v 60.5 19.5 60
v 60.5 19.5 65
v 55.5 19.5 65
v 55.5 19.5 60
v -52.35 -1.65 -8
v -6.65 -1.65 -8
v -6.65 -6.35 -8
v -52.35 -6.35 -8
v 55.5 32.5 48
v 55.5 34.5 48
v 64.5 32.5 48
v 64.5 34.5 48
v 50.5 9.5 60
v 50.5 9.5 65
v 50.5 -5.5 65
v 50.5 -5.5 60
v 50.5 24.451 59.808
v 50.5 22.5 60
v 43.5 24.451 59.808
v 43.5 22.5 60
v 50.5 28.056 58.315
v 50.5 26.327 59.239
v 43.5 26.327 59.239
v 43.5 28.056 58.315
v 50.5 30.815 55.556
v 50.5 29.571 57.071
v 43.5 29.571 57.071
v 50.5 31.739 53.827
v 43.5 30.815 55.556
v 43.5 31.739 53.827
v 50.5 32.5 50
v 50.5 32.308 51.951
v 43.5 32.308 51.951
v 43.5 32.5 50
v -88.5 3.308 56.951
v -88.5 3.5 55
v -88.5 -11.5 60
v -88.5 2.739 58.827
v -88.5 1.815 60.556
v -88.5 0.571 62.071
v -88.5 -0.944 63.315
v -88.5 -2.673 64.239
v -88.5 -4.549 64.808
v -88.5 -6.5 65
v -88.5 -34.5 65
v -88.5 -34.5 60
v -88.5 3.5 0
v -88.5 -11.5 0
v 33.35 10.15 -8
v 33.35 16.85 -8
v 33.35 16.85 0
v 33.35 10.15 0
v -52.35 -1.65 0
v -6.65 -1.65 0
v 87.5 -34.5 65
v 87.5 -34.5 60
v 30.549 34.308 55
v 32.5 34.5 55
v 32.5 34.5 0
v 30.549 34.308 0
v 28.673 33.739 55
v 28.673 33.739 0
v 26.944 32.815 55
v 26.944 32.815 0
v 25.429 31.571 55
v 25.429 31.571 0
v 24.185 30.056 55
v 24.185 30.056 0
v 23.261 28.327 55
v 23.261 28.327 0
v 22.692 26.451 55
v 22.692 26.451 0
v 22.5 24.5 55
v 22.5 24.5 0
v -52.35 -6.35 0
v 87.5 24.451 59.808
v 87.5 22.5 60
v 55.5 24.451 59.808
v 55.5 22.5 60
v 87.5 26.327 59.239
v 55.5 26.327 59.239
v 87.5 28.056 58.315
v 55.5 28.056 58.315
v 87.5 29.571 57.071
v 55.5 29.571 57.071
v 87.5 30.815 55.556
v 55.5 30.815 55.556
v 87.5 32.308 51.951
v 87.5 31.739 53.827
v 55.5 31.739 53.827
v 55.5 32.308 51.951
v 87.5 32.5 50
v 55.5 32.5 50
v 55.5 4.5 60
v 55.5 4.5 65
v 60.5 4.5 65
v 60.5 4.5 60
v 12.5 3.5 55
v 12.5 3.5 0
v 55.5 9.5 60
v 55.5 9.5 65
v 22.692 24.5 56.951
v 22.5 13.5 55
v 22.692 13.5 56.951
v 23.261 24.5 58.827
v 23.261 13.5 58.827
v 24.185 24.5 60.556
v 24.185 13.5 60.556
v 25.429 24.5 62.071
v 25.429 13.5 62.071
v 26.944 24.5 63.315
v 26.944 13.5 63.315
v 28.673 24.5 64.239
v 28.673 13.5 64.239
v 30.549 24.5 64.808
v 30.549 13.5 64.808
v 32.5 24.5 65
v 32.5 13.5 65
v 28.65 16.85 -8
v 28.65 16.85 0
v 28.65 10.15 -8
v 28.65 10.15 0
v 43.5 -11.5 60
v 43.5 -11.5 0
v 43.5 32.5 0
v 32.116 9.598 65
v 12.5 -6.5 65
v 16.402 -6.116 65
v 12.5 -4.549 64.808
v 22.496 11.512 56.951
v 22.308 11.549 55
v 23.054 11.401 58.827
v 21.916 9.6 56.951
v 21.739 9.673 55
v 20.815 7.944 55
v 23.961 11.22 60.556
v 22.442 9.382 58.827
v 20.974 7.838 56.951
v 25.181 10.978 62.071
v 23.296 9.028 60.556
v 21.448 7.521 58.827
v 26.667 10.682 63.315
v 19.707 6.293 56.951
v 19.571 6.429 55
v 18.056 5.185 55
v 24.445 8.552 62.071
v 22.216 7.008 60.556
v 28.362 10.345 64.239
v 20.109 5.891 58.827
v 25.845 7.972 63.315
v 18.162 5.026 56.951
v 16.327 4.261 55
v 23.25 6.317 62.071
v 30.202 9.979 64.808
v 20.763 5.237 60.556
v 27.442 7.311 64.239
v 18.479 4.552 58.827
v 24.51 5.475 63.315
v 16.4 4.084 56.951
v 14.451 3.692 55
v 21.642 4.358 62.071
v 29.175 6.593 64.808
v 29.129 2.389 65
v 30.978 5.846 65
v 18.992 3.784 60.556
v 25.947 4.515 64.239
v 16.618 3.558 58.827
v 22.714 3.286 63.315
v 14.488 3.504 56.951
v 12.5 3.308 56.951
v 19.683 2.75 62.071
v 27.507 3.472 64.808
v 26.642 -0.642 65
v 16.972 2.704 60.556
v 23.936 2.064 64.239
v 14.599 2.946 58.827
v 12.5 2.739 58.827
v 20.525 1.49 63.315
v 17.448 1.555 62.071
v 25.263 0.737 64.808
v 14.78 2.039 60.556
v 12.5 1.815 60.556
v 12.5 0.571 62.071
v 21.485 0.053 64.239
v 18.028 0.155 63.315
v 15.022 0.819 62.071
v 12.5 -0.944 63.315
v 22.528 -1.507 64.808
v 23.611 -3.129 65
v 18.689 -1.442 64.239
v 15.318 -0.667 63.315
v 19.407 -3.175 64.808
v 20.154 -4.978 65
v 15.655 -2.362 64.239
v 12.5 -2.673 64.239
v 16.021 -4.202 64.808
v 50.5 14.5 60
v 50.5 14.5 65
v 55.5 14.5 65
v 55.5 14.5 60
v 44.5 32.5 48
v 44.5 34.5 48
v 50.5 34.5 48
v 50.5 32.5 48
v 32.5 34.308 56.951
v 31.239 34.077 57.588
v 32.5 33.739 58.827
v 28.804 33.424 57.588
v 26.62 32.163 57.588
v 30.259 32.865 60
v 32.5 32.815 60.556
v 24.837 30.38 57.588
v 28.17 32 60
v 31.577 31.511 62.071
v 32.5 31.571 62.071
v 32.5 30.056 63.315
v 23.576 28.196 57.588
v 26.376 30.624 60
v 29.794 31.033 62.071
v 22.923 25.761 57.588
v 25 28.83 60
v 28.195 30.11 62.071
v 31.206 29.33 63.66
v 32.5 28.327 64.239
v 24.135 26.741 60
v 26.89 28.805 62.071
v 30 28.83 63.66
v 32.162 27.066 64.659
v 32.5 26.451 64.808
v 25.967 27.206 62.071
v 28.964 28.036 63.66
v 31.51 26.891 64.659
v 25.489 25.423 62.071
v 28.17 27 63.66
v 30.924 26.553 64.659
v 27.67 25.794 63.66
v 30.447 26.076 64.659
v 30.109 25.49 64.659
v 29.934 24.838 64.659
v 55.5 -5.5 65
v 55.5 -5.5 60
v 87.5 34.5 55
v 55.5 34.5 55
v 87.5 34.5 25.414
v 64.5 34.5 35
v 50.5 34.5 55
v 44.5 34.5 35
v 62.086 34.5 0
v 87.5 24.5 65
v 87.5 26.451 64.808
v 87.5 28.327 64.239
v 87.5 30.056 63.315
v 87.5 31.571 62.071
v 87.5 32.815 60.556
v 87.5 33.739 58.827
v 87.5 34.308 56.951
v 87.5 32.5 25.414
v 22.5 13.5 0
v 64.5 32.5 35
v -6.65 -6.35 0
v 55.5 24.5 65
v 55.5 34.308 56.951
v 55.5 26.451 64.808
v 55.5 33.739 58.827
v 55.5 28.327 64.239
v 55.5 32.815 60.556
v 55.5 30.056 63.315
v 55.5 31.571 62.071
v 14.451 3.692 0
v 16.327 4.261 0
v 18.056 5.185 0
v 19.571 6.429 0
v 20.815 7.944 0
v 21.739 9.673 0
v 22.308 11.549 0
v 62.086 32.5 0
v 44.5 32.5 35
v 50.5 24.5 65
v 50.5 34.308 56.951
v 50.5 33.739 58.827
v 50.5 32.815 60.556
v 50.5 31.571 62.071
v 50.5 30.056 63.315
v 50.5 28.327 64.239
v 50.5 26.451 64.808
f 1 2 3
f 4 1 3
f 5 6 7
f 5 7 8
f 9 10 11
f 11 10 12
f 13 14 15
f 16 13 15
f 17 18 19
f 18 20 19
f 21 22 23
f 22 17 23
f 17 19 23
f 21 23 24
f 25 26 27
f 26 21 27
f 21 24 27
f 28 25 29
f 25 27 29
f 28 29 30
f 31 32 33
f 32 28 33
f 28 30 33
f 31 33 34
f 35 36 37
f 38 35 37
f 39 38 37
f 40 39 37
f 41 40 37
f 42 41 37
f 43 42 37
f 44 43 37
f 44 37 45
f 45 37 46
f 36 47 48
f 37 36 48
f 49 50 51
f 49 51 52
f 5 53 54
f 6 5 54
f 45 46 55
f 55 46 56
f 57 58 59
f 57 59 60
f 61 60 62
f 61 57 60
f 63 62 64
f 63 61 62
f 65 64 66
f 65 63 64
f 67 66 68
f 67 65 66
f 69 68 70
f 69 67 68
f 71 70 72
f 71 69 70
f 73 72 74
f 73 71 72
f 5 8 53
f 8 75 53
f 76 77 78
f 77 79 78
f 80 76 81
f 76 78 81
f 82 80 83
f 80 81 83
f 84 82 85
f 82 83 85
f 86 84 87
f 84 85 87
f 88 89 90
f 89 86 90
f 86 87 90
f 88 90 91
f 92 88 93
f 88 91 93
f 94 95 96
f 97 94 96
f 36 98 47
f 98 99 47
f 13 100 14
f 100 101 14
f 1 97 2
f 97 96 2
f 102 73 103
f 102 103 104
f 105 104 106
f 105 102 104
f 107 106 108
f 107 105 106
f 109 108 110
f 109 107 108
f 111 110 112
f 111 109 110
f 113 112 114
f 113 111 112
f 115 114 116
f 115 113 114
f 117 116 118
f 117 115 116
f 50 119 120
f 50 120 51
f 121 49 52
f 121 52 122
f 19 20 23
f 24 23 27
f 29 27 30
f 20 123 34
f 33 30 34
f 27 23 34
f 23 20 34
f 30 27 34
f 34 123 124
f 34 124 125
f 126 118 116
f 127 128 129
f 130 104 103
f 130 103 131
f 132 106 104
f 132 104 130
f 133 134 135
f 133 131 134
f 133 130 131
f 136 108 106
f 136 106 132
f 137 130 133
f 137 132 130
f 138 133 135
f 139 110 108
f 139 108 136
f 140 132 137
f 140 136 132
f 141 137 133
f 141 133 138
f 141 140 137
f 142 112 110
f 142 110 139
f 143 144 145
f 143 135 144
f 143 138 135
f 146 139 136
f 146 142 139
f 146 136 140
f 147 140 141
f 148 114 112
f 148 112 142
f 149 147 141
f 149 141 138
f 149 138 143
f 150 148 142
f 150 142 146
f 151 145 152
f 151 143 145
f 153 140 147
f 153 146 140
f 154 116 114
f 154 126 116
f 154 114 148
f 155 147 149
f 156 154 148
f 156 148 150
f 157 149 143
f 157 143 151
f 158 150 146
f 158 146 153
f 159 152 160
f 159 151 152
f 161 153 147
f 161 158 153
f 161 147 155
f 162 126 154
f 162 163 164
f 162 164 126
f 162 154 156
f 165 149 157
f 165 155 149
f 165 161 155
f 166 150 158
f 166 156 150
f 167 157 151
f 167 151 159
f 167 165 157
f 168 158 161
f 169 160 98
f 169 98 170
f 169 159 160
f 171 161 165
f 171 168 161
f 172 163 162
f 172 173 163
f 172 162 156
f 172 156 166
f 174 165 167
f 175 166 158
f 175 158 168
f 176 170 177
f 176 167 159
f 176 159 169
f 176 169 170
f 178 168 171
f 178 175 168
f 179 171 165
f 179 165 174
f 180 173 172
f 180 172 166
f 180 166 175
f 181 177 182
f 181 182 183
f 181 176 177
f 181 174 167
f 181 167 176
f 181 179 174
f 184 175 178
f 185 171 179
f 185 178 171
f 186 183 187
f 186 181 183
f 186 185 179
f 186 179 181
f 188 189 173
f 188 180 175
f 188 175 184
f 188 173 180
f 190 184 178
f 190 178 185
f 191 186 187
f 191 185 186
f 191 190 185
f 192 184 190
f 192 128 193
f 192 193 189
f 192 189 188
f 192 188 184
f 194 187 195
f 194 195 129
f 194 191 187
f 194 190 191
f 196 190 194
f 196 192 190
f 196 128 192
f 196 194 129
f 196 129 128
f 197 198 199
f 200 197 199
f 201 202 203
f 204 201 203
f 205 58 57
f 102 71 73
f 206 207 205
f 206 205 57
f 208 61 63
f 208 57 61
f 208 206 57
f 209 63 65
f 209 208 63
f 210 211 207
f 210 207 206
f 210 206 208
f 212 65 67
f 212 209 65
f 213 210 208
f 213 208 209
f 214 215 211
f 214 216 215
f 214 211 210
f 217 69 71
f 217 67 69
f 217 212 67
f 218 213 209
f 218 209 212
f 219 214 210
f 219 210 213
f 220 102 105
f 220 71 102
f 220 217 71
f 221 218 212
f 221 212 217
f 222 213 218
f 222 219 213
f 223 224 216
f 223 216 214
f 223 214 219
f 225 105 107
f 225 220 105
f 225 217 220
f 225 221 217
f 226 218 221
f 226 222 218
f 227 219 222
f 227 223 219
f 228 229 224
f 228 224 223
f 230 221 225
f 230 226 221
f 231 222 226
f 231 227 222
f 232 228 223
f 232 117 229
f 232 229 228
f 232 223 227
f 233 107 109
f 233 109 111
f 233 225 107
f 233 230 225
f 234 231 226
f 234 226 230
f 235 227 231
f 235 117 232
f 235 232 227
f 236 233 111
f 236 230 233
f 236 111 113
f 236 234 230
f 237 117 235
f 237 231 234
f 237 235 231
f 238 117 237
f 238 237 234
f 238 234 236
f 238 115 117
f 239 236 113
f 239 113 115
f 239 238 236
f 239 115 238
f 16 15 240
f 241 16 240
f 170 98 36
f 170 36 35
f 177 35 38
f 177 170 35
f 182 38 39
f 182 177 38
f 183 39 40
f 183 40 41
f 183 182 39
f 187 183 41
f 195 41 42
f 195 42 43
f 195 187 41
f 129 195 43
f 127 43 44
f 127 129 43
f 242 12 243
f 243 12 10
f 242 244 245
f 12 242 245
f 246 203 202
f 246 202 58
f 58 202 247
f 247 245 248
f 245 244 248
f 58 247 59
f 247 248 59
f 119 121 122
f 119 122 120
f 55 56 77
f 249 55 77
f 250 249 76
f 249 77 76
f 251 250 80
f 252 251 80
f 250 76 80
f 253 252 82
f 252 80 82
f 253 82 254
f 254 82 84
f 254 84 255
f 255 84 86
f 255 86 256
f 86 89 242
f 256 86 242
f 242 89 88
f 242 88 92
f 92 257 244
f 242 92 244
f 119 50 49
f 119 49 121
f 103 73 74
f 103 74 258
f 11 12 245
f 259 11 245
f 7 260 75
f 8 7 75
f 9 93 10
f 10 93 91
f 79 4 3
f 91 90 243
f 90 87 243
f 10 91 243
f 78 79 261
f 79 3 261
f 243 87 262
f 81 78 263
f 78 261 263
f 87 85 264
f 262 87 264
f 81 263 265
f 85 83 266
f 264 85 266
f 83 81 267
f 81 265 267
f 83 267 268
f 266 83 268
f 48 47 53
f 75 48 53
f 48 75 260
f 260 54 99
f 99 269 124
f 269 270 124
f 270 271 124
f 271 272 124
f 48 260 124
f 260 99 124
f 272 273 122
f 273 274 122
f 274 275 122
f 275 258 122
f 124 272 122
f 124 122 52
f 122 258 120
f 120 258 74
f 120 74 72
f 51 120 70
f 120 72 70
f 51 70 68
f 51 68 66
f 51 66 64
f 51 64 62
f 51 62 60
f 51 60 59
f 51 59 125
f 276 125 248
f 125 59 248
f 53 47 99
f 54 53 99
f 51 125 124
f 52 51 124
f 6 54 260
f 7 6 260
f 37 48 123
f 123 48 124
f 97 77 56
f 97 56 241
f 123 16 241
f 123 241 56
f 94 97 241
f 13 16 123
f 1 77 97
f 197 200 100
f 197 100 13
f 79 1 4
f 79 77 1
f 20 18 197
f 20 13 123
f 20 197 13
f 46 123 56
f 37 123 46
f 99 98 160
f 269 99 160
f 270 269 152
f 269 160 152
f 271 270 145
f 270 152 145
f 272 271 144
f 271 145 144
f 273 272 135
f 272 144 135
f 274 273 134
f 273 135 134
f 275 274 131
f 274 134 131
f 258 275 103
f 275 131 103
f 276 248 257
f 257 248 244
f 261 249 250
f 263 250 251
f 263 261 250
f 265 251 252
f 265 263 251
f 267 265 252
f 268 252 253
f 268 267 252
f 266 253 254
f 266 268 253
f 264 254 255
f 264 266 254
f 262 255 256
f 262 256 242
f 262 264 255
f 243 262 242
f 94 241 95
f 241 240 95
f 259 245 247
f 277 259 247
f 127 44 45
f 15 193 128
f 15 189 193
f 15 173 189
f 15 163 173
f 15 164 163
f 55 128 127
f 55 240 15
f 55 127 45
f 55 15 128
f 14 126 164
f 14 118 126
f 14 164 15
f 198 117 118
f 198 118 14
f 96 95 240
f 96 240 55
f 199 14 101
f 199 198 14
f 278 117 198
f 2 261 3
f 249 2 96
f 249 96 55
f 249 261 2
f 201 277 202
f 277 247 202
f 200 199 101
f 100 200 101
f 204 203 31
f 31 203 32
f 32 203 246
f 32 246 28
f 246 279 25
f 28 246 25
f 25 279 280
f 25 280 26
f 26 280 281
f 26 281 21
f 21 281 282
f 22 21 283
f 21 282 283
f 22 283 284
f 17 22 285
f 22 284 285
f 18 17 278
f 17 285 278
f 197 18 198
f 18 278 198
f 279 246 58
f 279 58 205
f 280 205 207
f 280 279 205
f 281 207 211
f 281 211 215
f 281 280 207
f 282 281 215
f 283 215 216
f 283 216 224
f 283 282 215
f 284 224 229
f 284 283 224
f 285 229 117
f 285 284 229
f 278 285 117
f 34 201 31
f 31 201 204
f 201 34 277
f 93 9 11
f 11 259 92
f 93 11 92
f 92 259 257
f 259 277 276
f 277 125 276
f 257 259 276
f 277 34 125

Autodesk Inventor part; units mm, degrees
ref_plane "YZ Plane" through (0, 0, 0) normal (1, 0, 0) x (0, 1, 0)
ref_plane "XZ Plane" through (0, 0, 0) normal (0, 1, 0) x (-1, 0, 0)
ref_plane "XY Plane" through (0, 0, 0) normal (0, 0, 1) x (1, 0, 0)
sketch "Sketch1" plane through (0, 0, 0) normal (0, 0, 1) x (1, 0, 0)
  line L0 (-88.5, 34.5) -> (88.5, 34.5)
  line L1 (88.5, 34.5) -> (88.5, -34.5)
  line L2 (88.5, -34.5) -> (-88.5, -34.5)
  line L3 (-88.5, -34.5) -> (-88.5, 34.5)
  point P0 (0, 0)
  point P1 (-88.5, 0)
  point P2 (0, 34.5)
  dimension "d0" = 177
  dimension "d1" = 69
sketch "Sketch1 outline for Extrusion1" plane through (0, 0, 0) normal (0, 0, 1) x (1, 0, 0)
  line L0 (-88.5, -34.5) -> (88.5, -34.5)
  line L1 (-88.5, 34.5) -> (-88.5, -34.5)
  line L2 (88.5, 34.5) -> (-88.5, 34.5)
  line L3 (88.5, -34.5) -> (88.5, 34.5)
extrude "Extrusion1" add sketch "Sketch1 outline for Extrusion1" along normal blind 65
sketch "Sketch2" plane through (0, 0, 0) normal (0, 0, -1) x (-1, 0, 0)
  line L0 (232.5, 3.5) -> (-12.5, 3.5) projected
  line L1 (88.5, 34.5) -> (88.5, -34.5) projected
  line L2 (-88.5, 34.5) -> (88.5, 34.5) projected
  line L3 (-22.5, 34.5) -> (-22.5, 3.5)
  line L4 (-22.5, 13.5) -> (-22.5, 24.5) projected
  line L5 (-12.5, 3.5) -> (-22.5, 3.5)
  point P0 (0, 0)
  point P1 (88.5, 3.5)
sketch "Sketch2 outline for Extrusion2" plane through (0, 0, 0) normal (0, 0, -1) x (-1, 0, 0)
  line L0 (-22.5, 3.5) -> (-12.5, 3.5)
  line L1 (-22.5, 34.5) -> (-22.5, 3.5)
  line L2 (88.5, 34.5) -> (-22.5, 34.5)
  line L3 (88.5, 3.5) -> (88.5, 34.5)
  line L4 (-12.5, 3.5) -> (88.5, 3.5)
extrude "Extrusion2" cut sketch "Sketch2 outline for Extrusion2" against normal through all
fillet "Fillet1" radius 10 2 edges at (22.5, 3.5, 32.5) (22.5, 34.5, 32.5)
sketch "Sketch3" plane through (0, 0, 0) normal (0, 0, -1) x (-1, 0, 0)
  line L0 (-43.5, -11.5) -> (216.5, -11.5) projected
  line L1 (-43.5, 32.5) -> (-43.5, -11.5) projected
  line L2 (-90.5, 32.5) -> (-43.5, 32.5) projected
  line L3 (-88.5, 32.5) -> (-88.5, -34.5)
  line L4 (-88.5, -34.5) -> (88.5, -34.5)
  line L5 (88.5, -34.5) -> (88.5, -11.5)
  line L6 (88.5, 3.5) -> (88.5, -34.5) projected
  line L7 (88.5, -34.5) -> (-88.5, -34.5) projected
  line L8 (-88.5, -34.5) -> (-88.5, 34.5) projected
  point P0 (0, 0)
sketch "Sketch3 outline for Extrusion3" plane through (0, 0, 0) normal (0, 0, -1) x (-1, 0, 0)
  line L0 (-43.5, -11.5) -> (-43.5, 32.5)
  line L1 (88.5, -11.5) -> (-43.5, -11.5)
  line L2 (88.5, -34.5) -> (88.5, -11.5)
  line L3 (-88.5, -34.5) -> (88.5, -34.5)
  line L4 (-88.5, 32.5) -> (-88.5, -34.5)
  line L5 (-43.5, 32.5) -> (-88.5, 32.5)
extrude "Extrusion3" cut sketch "Sketch3 outline for Extrusion3" against normal blind 60
sketch "Sketch4" plane through (88.5, 34.5, 65) normal (0, 1, 0) x (1, 0, 0)
  line L0 (0, 65) -> (-56, 65)
  line L1 (0, 65) -> (0, 0)
  line L2 (0, 40) -> (-25, 65)
  line L3 (0, 38.585786) -> (-26.414214, 65)
  point P0 (-88.5, 65)
  dimension "d40" = 1
sketch "Sketch4 outline for Extrusion4" plane through (88.5, 34.5, 65) normal (0, 1, 0) x (1, 0, 0)
  line L0 (0, 65) -> (-26.414214, 65)
  line L1 (-26.414214, 65) -> (0, 38.585786)
  line L2 (0, 38.585786) -> (0, 65)
extrude "Extrusion4" cut sketch "Sketch4 outline for Extrusion4" against normal blind 60
sketch "Sketch5" plane through (0, 0, 65) normal (0, 0, 1) x (1, 0, 0)
  line L0 (50.5, -5.5) -> (55.5, -5.5)
  line L1 (55.5, -5.5) -> (55.5, 9.5)
  line L2 (55.5, 9.5) -> (50.5, 9.5)
  line L3 (50.5, 9.5) -> (50.5, -5.5)
  line L4 (-88.5, -34.5) -> (88.5, -34.5) projected
  line L5 (88.5, -34.5) -> (88.5, 34.5) projected
  line L6 (55.5, 9.5) -> (60.5, 9.5)
  line L7 (60.5, 9.5) -> (60.5, 4.5)
  line L8 (60.5, 4.5) -> (55.5, 4.5)
  line L9 (55.5, 4.5) -> (55.5, 9.5)
  line L10 (55.5, 19.5) -> (60.5, 19.5)
  line L11 (60.5, 19.5) -> (60.5, 9.5)
  line L12 (60.5, 9.5) -> (55.5, 9.5)
  line L13 (55.5, 9.5) -> (55.5, 19.5)
  line L14 (50.5, 19.5) -> (55.5, 19.5)
  line L15 (55.5, 19.5) -> (55.5, 14.5)
  line L16 (55.5, 14.5) -> (50.5, 14.5)
  line L17 (50.5, 14.5) -> (50.5, 19.5)
  line L18 (50.5, 34.5) -> (55.5, 34.5)
  line L19 (55.5, 34.5) -> (55.5, 19.5)
  line L20 (55.5, 19.5) -> (50.5, 19.5)
  line L21 (50.5, 19.5) -> (50.5, 34.5)
  line L22 (88.5, 34.5) -> (32.5, 34.5) projected
  point P0 (0, 0)
  dimension "d11" = 5
  dimension "d13" = 33
  dimension "d20" = 5
  dimension "d21" = 10
  dimension "d23" = 15
  dimension "d24" = 15
sketch "Sketch5 outline for Extrusion5" plane through (0, 0, 65) normal (0, 0, 1) x (1, 0, 0)
  line L0 (55.5, 9.5) -> (50.5, 9.5)
  line L1 (50.5, 9.5) -> (50.5, -5.5)
  line L2 (50.5, -5.5) -> (55.5, -5.5)
  line L3 (55.5, -5.5) -> (55.5, 4.5)
  line L4 (55.5, 4.5) -> (60.5, 4.5)
  line L5 (60.5, 4.5) -> (60.5, 19.5)
  line L6 (60.5, 19.5) -> (55.5, 19.5)
  line L7 (55.5, 19.5) -> (55.5, 34.5)
  line L8 (55.5, 34.5) -> (50.5, 34.5)
  line L9 (50.5, 34.5) -> (50.5, 14.5)
  line L10 (50.5, 14.5) -> (55.5, 14.5)
  line L11 (55.5, 14.5) -> (55.5, 9.5)
extrude "Extrusion5" cut sketch "Sketch5 outline for Extrusion5" against normal blind 30
sketch "Sketch6" plane through (0, 0, 0) normal (0, 0, -1) x (-1, 0, 0)
  line L0 (-28.5, 18.5) -> (-33.5, 18.5) projected
  line L1 (-33.5, 18.5) -> (-33.5, 8.5) projected
  line L2 (-28.5, 8.5) -> (-28.5, 18.5) projected
  line L3 (-33.5, 8.5) -> (-28.5, 8.5) projected
  line L4 (54.5, -1.5) -> (4.5, -1.5) projected
  line L5 (4.5, -1.5) -> (4.5, -6.5) projected
  line L6 (4.5, -6.5) -> (54.5, -6.5) projected
  line L7 (54.5, -6.5) -> (54.5, -1.5) projected
  line L8 (4.65, -1.65) -> (54.35, -1.65)
  line L9 (54.35, -1.65) -> (54.35, -6.35)
  line L10 (54.35, -6.35) -> (4.65, -6.35)
  line L11 (4.65, -6.35) -> (4.65, -1.65)
  line L12 (-33.35, 8.65) -> (-33.35, 18.35)
  line L13 (-33.35, 18.35) -> (-28.65, 18.35)
  line L14 (-28.65, 18.35) -> (-28.65, 8.65)
  line L15 (-28.65, 8.65) -> (-33.35, 8.65)
  line L16 (-33.35, 16.85) -> (-28.65, 16.85)
  line L17 (-33.35, 10.15) -> (-28.65, 10.15)
  line L18 (6.65, -6.35) -> (6.65, -1.65)
  line L19 (52.35, -6.35) -> (52.35, -1.65)
  point P0 (0, 0)
  dimension "d17" = 0.15
  dimension "d35" = 0.15
  dimension "d36" = 1.5
  dimension "d37" = 1.5
  dimension "d38" = 2
  dimension "d39" = 2
sketch "Sketch6 outline for Extrusion6" plane through (0, 0, 0) normal (0, 0, -1) x (-1, 0, 0)
  line L0 (-33.35, 10.15) -> (-28.65, 10.15)
  line L1 (-33.35, 16.85) -> (-33.35, 10.15)
  line L2 (-28.65, 16.85) -> (-33.35, 16.85)
  line L3 (-28.65, 10.15) -> (-28.65, 16.85)
  line L4 (52.35, -6.35) -> (52.35, -1.65)
  line L5 (6.65, -6.35) -> (52.35, -6.35)
  line L6 (6.65, -1.65) -> (6.65, -6.35)
  line L7 (52.35, -1.65) -> (6.65, -1.65)
extrude "Extrusion6" add sketch "Sketch6 outline for Extrusion6" along normal blind 8
fillet "Fillet2" radius 10 6 edges at (72, 34.5, 65) (25.4289, 31.5711, 65) (22.5, 19, 65) (19.5711, 6.4289, 65) (-38, 3.5, 65) (41.5, 34.5, 65)
sketch "Sketch7" plane through (32.5, 34.5, 0) normal (0, 1, 0) x (1, 0, 0)
  line L0 (32, -48) -> (12, -48)
  line L1 (12, -48) -> (12, -35)
  line L2 (12, -35) -> (32, -35)
  line L3 (32, -35) -> (32, -48)
  line L4 (18, -35) -> (23, -35) projected
  point P0 (-32.5, 0)
  point P1 (20.5, -35)
  dimension "d26" = 20
  dimension "d27" = 13
sketch "Sketch7 outline for Extrusion7" plane through (32.5, 34.5, 0) normal (0, 1, 0) x (1, 0, 0)
  line L0 (12, -35) -> (12, -48)
  line L1 (32, -35) -> (12, -35)
  line L2 (32, -48) -> (32, -35)
  line L3 (12, -48) -> (32, -48)
extrude "Extrusion7" cut sketch "Sketch7 outline for Extrusion7" against normal blind 30
move faces "Move1" translate (-1, 0, 0) faces at (88.5, 7.5, 61.666667)
fillet "Fillet3" radius 10 2 edges at (71.5, 32.5, 60) (47, 32.5, 60)
properties part number "0008-30-011"
